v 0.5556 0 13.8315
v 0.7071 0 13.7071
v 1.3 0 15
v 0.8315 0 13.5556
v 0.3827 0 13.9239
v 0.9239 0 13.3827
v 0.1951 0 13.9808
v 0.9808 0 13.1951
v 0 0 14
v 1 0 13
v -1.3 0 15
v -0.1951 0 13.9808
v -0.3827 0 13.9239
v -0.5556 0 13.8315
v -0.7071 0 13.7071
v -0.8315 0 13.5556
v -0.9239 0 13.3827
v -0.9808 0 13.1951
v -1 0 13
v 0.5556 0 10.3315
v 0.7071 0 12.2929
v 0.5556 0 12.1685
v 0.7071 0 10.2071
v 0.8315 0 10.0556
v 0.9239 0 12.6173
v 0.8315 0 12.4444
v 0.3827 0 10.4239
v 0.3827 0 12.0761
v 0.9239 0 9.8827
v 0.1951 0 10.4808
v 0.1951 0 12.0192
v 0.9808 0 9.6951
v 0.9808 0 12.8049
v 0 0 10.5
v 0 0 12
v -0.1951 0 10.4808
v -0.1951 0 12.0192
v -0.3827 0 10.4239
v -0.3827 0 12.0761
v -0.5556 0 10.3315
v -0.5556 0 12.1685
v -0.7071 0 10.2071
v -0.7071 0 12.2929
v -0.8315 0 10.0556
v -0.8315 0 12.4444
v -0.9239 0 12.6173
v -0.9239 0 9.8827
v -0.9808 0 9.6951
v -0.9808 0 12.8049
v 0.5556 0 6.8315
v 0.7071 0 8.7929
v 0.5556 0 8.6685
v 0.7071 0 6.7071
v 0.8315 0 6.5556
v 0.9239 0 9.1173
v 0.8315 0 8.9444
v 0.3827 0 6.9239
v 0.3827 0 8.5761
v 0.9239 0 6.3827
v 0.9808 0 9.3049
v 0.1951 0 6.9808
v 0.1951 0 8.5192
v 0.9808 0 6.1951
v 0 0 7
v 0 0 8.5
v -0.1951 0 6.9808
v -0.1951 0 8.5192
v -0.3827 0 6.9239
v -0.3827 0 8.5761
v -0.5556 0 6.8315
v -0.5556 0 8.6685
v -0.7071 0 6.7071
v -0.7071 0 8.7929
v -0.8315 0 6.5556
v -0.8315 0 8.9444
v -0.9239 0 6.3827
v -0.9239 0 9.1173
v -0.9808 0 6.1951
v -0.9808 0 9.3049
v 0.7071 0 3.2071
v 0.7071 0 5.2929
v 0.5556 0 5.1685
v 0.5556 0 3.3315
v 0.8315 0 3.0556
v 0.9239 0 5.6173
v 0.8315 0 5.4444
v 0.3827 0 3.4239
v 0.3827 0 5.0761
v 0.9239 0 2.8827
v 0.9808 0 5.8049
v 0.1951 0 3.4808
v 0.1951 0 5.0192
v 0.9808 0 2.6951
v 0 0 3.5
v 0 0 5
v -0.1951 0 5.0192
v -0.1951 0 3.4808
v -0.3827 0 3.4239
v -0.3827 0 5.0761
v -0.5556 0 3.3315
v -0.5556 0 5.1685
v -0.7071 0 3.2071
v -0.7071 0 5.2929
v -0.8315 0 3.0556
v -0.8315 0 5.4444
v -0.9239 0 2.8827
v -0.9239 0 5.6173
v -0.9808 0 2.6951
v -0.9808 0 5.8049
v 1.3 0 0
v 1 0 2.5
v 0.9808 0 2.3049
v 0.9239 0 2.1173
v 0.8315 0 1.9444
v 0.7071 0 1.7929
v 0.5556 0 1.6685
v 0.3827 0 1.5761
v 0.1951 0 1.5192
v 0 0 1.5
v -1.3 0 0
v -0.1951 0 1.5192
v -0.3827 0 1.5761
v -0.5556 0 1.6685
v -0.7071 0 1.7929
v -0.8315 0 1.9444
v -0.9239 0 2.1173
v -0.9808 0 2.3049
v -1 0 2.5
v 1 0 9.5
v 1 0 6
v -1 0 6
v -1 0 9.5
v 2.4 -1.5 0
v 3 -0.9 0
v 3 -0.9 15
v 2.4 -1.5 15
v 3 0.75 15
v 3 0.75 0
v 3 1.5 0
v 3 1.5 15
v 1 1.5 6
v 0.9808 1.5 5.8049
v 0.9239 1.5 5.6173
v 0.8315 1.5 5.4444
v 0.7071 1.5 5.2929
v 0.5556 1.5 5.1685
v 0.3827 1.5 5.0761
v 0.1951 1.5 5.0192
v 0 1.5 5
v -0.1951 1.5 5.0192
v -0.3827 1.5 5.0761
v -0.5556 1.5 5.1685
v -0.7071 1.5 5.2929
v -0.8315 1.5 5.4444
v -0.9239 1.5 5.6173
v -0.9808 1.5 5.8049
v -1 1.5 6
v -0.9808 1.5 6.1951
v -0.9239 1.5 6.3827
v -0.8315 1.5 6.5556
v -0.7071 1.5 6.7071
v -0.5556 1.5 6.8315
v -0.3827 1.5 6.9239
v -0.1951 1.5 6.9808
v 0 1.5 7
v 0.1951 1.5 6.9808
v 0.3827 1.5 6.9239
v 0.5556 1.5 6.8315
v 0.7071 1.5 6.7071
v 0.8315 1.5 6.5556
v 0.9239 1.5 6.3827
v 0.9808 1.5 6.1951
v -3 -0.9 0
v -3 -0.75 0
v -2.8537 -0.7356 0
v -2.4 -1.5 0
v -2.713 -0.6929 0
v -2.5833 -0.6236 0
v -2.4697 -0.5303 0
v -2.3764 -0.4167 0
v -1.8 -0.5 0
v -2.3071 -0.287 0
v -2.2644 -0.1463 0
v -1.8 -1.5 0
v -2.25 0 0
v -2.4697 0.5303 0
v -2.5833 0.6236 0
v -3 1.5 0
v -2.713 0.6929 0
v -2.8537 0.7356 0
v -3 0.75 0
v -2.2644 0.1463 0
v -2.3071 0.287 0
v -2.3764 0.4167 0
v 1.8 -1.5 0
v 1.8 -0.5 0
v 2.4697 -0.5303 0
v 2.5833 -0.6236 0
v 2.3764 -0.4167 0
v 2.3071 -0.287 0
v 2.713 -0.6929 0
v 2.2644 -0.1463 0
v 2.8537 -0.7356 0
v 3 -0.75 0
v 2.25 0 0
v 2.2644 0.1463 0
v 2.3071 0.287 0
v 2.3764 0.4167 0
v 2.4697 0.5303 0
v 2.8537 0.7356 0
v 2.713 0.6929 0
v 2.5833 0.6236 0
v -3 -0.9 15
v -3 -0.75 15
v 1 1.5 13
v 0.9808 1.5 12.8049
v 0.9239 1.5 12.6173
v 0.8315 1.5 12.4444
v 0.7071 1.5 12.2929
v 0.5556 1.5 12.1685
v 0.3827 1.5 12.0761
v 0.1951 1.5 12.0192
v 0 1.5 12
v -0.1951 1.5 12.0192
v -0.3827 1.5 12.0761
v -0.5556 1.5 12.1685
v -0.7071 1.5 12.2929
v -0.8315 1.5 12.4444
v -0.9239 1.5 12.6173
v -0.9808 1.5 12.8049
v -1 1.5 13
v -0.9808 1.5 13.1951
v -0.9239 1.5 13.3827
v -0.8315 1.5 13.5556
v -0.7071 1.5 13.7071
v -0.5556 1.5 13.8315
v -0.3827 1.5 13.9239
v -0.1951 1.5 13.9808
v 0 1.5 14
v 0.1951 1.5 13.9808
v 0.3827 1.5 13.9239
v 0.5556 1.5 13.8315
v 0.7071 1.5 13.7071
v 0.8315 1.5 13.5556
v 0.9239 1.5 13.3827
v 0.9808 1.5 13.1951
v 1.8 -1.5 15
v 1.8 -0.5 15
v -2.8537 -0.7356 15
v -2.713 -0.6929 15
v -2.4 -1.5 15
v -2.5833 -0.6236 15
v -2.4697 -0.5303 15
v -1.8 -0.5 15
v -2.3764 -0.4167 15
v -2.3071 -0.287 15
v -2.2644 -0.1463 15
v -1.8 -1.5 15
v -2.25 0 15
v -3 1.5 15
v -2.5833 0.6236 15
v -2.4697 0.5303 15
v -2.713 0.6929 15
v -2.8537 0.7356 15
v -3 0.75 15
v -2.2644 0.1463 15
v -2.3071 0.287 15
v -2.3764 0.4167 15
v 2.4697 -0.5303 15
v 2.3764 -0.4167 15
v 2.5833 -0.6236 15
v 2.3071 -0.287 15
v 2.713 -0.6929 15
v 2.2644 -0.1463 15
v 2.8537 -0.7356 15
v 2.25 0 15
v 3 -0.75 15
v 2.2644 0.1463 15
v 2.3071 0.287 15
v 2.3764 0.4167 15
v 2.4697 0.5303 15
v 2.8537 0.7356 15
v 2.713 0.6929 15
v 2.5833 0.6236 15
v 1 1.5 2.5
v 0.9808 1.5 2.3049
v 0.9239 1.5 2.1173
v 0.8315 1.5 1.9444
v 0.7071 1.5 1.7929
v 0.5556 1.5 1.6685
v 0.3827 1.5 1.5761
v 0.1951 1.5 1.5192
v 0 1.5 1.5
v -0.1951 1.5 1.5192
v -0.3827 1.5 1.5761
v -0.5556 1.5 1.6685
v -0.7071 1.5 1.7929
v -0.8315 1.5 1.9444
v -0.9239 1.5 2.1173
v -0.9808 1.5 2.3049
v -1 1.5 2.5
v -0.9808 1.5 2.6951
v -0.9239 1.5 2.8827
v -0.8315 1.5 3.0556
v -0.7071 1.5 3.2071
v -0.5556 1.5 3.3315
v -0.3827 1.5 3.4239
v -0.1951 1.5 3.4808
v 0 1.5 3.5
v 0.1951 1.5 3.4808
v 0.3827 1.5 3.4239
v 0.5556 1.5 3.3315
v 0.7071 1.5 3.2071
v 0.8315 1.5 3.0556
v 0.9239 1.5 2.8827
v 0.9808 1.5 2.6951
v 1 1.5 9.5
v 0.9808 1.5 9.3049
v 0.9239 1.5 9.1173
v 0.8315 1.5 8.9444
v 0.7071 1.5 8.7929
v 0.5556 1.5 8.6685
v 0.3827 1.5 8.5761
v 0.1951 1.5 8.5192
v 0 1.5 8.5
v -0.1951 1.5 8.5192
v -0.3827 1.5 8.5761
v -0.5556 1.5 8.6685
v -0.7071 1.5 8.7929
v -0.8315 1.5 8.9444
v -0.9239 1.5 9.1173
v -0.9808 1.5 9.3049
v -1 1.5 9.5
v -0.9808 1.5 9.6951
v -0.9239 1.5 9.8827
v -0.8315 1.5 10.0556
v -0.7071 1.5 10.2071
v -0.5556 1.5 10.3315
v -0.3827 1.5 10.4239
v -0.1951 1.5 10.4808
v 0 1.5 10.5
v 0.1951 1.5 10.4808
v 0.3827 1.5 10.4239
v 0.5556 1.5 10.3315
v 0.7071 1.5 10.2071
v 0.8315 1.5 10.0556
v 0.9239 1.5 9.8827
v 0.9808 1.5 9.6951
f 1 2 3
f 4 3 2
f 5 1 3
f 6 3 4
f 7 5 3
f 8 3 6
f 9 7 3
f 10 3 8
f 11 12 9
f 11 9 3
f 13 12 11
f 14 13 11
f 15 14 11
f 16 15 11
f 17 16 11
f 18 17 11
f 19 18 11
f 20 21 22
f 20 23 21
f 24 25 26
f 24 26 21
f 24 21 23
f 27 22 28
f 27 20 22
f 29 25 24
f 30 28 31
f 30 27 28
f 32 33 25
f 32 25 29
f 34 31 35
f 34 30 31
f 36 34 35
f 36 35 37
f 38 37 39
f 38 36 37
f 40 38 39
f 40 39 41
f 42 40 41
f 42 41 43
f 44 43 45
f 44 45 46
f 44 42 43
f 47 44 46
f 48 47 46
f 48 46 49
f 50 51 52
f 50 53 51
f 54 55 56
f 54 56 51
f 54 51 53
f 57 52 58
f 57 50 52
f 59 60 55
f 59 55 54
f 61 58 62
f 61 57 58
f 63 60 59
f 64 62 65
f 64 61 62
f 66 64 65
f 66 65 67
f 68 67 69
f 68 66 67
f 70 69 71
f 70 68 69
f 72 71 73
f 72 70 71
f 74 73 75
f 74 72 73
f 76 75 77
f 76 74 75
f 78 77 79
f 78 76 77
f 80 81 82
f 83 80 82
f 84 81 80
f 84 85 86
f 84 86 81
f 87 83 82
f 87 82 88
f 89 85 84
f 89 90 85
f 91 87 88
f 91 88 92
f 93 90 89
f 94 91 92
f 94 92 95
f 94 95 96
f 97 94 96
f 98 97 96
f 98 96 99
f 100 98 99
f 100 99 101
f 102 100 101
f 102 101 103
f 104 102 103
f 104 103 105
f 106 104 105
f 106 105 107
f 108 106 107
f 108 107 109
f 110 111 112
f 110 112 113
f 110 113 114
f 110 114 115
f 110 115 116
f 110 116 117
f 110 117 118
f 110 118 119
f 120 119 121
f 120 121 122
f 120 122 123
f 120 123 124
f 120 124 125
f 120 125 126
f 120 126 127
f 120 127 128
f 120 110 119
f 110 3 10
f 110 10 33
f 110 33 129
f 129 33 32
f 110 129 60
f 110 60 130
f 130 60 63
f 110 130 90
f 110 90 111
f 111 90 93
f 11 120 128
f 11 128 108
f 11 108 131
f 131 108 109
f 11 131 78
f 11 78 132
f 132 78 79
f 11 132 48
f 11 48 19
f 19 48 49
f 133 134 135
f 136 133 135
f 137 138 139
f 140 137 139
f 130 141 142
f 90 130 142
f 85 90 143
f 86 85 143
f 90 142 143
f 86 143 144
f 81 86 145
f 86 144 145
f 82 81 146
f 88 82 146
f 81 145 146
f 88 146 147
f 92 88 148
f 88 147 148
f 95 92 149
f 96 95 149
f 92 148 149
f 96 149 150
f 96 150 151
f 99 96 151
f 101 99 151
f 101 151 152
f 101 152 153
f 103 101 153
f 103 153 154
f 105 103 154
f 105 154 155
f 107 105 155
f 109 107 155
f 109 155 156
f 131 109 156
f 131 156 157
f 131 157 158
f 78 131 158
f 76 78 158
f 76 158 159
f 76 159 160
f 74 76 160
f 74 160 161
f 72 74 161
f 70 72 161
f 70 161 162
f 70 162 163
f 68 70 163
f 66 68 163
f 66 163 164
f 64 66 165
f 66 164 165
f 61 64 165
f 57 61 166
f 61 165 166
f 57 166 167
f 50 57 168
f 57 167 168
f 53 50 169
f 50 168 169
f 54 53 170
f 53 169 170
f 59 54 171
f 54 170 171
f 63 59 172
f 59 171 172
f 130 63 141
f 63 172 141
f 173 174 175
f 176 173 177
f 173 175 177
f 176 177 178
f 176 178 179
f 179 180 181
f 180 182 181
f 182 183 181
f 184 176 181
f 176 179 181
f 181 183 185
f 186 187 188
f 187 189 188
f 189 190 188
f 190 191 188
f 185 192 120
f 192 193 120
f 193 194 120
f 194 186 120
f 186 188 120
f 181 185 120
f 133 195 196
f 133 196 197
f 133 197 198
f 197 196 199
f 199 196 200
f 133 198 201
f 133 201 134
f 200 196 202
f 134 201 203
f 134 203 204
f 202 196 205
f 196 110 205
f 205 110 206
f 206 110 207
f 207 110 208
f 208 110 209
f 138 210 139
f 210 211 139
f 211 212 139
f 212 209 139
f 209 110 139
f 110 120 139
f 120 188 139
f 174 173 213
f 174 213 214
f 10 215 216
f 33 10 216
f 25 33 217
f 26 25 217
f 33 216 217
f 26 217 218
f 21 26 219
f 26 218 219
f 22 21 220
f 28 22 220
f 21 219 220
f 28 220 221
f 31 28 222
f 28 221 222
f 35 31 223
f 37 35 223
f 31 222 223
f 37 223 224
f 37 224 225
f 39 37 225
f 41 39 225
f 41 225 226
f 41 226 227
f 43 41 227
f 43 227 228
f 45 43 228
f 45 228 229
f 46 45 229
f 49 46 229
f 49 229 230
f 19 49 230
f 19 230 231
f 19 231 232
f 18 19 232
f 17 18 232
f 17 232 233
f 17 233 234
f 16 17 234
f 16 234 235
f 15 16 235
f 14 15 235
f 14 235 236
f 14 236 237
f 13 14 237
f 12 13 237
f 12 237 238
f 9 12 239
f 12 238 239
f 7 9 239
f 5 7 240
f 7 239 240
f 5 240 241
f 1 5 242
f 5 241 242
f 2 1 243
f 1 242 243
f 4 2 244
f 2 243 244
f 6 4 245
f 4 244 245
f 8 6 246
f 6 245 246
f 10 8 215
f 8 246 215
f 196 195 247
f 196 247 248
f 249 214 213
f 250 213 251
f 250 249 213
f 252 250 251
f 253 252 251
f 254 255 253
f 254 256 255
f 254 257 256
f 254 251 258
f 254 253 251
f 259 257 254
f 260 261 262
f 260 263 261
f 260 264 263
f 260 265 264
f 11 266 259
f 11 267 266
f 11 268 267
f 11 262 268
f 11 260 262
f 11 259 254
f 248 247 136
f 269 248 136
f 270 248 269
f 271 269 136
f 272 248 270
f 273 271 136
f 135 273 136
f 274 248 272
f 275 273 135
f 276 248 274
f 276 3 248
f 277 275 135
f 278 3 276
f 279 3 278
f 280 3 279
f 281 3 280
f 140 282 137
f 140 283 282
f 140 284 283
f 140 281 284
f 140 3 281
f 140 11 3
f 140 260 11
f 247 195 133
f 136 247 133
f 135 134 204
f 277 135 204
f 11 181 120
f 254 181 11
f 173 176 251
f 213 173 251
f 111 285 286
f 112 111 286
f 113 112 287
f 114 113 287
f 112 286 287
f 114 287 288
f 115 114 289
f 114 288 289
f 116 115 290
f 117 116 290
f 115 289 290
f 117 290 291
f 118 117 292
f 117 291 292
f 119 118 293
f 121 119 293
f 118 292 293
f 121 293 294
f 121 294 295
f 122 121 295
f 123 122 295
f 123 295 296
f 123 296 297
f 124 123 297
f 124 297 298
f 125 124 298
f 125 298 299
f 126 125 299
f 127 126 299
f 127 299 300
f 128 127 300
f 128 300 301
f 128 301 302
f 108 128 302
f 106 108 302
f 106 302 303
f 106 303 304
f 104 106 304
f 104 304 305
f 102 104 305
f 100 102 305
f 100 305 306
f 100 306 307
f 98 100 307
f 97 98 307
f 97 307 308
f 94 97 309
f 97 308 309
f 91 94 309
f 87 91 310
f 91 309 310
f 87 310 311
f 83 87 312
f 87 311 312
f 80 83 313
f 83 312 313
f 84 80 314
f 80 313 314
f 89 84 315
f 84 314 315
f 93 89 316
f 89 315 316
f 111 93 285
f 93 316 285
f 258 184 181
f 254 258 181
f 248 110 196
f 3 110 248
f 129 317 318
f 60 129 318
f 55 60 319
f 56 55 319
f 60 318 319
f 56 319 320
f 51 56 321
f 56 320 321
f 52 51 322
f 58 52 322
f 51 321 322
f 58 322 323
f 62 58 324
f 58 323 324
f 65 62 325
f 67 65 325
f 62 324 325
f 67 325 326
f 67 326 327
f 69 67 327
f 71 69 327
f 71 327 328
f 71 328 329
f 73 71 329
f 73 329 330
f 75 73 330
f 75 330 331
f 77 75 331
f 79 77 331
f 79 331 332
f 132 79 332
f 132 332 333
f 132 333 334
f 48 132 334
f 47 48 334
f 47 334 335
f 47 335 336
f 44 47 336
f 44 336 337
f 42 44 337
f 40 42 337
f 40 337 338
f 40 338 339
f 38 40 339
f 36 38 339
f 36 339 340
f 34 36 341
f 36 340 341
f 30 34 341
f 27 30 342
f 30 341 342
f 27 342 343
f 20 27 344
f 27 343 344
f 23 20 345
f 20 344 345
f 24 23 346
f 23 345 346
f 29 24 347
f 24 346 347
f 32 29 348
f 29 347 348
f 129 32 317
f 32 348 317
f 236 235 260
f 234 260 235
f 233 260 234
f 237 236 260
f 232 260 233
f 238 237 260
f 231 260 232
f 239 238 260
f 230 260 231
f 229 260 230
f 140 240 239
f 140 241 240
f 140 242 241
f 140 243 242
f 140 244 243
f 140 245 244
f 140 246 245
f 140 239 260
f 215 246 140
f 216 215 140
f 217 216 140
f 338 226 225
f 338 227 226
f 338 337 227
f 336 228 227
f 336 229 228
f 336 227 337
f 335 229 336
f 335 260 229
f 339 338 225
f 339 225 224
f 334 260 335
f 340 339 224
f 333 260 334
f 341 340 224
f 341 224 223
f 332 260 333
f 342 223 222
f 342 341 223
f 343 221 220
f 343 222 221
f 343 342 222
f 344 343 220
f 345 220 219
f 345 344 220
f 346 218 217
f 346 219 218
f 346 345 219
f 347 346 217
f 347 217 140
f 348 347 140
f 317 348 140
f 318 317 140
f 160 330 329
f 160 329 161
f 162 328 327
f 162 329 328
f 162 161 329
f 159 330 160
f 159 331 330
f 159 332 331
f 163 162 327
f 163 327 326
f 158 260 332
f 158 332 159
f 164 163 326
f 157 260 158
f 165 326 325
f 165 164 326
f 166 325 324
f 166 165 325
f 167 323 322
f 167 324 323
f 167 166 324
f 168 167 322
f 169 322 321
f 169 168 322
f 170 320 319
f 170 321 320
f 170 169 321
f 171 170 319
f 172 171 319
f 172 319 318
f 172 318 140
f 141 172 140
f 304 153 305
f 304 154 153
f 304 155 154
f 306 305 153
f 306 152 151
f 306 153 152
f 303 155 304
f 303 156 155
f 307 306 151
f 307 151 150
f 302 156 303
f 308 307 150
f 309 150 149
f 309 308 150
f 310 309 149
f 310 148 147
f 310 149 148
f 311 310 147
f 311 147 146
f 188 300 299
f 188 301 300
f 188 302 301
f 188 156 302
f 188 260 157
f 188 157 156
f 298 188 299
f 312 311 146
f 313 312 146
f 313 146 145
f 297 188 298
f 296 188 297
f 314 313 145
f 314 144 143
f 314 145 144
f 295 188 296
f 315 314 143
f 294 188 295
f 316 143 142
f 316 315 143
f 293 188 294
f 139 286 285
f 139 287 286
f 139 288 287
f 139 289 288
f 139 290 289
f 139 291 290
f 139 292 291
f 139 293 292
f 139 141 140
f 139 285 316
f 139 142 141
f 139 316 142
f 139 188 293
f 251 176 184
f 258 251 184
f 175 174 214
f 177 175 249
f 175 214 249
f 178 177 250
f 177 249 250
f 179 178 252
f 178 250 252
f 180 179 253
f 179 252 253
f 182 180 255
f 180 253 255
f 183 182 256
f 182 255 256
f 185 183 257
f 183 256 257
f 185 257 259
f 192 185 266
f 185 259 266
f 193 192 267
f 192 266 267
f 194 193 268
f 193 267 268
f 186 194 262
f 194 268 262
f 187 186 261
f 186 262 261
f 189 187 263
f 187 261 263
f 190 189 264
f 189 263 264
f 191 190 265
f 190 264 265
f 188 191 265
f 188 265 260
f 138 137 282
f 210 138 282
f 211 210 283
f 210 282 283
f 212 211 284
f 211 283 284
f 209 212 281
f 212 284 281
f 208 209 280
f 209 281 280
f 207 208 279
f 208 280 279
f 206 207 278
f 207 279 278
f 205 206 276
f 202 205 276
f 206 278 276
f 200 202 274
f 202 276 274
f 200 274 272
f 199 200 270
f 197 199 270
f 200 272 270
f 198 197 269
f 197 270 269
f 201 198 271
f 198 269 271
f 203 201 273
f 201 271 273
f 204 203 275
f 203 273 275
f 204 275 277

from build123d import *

# Parameters (mm, degrees)
SKETCH1_W           = 6
SKETCH1_H           = 3
BOSS_EXTRUDE1_DEPTH = 15
SKETCH2_R           = 0.75
CUT_EXTRUDE1_DEPTH  = 20
CHAMFER1_SIZE       = 0.6
SKETCH3_R           = 1
CUT_EXTRUDE2_DEPTH  = 20
LPATTERN1_COUNT     = 4
LPATTERN1_PITCH     = 3.5
SKETCH4_W           = 3.6
SKETCH4_H           = 1.5
CUT_EXTRUDE3_DEPTH  = 20
CHAMFER2_SIZE       = 0.5


with BuildPart() as part:
    # Sketch1 → Boss-Extrude1 (new body)
    with BuildSketch(Plane.XY):
        Rectangle(SKETCH1_W, SKETCH1_H)
    extrude(amount=BOSS_EXTRUDE1_DEPTH)

    # Sketch2 → Cut-Extrude1 (cut)
    with BuildSketch(Plane.XY.offset(15)):
        with Locations((3, 0)):
            Circle(SKETCH2_R)
        with Locations((-3, 0)):
            Circle(SKETCH2_R)
    extrude(amount=-CUT_EXTRUDE1_DEPTH, mode=Mode.SUBTRACT)

    # Chamfer1
    chamfer1_edges = [part.edges().sort_by_distance(p)[0] for p in [
        (3, -1.5, 7.5),
        (-3, -1.5, 7.5),
    ]]
    chamfer(chamfer1_edges, length=CHAMFER1_SIZE)

    # Sketch3 → Cut-Extrude2 (cut)
    with BuildSketch(Plane(origin=(0, 1.5, 0), x_dir=(1, 0, 0), z_dir=(0, 1, 0))):
        with Locations((0, -2.5)):
            Circle(SKETCH3_R)
    cut_extrude2 = extrude(amount=-CUT_EXTRUDE2_DEPTH, mode=Mode.SUBTRACT)

    # LPattern1: Cut-Extrude2 ×4
    with Locations(*[(0, 0, i * LPATTERN1_PITCH) for i in range(1, LPATTERN1_COUNT)]):
        add(cut_extrude2, mode=Mode.SUBTRACT)

    # Sketch4 → Cut-Extrude3 (cut)
    with BuildSketch(Plane(origin=(0, 0, 0), x_dir=(-1, 0, 0), z_dir=(0, 0, -1))):
        with Locations((0, -0.75)):
            Rectangle(SKETCH4_W, SKETCH4_H)
    extrude(amount=-CUT_EXTRUDE3_DEPTH, mode=Mode.SUBTRACT)

    # Chamfer2
    chamfer2_edges = [part.edges().sort_by_distance(p)[0] for p in [
        (1.8, 0, 7.5),
        (-1.8, 0, 7.5),
    ]]
    chamfer(chamfer2_edges, length=CHAMFER2_SIZE)


solid = part.part
